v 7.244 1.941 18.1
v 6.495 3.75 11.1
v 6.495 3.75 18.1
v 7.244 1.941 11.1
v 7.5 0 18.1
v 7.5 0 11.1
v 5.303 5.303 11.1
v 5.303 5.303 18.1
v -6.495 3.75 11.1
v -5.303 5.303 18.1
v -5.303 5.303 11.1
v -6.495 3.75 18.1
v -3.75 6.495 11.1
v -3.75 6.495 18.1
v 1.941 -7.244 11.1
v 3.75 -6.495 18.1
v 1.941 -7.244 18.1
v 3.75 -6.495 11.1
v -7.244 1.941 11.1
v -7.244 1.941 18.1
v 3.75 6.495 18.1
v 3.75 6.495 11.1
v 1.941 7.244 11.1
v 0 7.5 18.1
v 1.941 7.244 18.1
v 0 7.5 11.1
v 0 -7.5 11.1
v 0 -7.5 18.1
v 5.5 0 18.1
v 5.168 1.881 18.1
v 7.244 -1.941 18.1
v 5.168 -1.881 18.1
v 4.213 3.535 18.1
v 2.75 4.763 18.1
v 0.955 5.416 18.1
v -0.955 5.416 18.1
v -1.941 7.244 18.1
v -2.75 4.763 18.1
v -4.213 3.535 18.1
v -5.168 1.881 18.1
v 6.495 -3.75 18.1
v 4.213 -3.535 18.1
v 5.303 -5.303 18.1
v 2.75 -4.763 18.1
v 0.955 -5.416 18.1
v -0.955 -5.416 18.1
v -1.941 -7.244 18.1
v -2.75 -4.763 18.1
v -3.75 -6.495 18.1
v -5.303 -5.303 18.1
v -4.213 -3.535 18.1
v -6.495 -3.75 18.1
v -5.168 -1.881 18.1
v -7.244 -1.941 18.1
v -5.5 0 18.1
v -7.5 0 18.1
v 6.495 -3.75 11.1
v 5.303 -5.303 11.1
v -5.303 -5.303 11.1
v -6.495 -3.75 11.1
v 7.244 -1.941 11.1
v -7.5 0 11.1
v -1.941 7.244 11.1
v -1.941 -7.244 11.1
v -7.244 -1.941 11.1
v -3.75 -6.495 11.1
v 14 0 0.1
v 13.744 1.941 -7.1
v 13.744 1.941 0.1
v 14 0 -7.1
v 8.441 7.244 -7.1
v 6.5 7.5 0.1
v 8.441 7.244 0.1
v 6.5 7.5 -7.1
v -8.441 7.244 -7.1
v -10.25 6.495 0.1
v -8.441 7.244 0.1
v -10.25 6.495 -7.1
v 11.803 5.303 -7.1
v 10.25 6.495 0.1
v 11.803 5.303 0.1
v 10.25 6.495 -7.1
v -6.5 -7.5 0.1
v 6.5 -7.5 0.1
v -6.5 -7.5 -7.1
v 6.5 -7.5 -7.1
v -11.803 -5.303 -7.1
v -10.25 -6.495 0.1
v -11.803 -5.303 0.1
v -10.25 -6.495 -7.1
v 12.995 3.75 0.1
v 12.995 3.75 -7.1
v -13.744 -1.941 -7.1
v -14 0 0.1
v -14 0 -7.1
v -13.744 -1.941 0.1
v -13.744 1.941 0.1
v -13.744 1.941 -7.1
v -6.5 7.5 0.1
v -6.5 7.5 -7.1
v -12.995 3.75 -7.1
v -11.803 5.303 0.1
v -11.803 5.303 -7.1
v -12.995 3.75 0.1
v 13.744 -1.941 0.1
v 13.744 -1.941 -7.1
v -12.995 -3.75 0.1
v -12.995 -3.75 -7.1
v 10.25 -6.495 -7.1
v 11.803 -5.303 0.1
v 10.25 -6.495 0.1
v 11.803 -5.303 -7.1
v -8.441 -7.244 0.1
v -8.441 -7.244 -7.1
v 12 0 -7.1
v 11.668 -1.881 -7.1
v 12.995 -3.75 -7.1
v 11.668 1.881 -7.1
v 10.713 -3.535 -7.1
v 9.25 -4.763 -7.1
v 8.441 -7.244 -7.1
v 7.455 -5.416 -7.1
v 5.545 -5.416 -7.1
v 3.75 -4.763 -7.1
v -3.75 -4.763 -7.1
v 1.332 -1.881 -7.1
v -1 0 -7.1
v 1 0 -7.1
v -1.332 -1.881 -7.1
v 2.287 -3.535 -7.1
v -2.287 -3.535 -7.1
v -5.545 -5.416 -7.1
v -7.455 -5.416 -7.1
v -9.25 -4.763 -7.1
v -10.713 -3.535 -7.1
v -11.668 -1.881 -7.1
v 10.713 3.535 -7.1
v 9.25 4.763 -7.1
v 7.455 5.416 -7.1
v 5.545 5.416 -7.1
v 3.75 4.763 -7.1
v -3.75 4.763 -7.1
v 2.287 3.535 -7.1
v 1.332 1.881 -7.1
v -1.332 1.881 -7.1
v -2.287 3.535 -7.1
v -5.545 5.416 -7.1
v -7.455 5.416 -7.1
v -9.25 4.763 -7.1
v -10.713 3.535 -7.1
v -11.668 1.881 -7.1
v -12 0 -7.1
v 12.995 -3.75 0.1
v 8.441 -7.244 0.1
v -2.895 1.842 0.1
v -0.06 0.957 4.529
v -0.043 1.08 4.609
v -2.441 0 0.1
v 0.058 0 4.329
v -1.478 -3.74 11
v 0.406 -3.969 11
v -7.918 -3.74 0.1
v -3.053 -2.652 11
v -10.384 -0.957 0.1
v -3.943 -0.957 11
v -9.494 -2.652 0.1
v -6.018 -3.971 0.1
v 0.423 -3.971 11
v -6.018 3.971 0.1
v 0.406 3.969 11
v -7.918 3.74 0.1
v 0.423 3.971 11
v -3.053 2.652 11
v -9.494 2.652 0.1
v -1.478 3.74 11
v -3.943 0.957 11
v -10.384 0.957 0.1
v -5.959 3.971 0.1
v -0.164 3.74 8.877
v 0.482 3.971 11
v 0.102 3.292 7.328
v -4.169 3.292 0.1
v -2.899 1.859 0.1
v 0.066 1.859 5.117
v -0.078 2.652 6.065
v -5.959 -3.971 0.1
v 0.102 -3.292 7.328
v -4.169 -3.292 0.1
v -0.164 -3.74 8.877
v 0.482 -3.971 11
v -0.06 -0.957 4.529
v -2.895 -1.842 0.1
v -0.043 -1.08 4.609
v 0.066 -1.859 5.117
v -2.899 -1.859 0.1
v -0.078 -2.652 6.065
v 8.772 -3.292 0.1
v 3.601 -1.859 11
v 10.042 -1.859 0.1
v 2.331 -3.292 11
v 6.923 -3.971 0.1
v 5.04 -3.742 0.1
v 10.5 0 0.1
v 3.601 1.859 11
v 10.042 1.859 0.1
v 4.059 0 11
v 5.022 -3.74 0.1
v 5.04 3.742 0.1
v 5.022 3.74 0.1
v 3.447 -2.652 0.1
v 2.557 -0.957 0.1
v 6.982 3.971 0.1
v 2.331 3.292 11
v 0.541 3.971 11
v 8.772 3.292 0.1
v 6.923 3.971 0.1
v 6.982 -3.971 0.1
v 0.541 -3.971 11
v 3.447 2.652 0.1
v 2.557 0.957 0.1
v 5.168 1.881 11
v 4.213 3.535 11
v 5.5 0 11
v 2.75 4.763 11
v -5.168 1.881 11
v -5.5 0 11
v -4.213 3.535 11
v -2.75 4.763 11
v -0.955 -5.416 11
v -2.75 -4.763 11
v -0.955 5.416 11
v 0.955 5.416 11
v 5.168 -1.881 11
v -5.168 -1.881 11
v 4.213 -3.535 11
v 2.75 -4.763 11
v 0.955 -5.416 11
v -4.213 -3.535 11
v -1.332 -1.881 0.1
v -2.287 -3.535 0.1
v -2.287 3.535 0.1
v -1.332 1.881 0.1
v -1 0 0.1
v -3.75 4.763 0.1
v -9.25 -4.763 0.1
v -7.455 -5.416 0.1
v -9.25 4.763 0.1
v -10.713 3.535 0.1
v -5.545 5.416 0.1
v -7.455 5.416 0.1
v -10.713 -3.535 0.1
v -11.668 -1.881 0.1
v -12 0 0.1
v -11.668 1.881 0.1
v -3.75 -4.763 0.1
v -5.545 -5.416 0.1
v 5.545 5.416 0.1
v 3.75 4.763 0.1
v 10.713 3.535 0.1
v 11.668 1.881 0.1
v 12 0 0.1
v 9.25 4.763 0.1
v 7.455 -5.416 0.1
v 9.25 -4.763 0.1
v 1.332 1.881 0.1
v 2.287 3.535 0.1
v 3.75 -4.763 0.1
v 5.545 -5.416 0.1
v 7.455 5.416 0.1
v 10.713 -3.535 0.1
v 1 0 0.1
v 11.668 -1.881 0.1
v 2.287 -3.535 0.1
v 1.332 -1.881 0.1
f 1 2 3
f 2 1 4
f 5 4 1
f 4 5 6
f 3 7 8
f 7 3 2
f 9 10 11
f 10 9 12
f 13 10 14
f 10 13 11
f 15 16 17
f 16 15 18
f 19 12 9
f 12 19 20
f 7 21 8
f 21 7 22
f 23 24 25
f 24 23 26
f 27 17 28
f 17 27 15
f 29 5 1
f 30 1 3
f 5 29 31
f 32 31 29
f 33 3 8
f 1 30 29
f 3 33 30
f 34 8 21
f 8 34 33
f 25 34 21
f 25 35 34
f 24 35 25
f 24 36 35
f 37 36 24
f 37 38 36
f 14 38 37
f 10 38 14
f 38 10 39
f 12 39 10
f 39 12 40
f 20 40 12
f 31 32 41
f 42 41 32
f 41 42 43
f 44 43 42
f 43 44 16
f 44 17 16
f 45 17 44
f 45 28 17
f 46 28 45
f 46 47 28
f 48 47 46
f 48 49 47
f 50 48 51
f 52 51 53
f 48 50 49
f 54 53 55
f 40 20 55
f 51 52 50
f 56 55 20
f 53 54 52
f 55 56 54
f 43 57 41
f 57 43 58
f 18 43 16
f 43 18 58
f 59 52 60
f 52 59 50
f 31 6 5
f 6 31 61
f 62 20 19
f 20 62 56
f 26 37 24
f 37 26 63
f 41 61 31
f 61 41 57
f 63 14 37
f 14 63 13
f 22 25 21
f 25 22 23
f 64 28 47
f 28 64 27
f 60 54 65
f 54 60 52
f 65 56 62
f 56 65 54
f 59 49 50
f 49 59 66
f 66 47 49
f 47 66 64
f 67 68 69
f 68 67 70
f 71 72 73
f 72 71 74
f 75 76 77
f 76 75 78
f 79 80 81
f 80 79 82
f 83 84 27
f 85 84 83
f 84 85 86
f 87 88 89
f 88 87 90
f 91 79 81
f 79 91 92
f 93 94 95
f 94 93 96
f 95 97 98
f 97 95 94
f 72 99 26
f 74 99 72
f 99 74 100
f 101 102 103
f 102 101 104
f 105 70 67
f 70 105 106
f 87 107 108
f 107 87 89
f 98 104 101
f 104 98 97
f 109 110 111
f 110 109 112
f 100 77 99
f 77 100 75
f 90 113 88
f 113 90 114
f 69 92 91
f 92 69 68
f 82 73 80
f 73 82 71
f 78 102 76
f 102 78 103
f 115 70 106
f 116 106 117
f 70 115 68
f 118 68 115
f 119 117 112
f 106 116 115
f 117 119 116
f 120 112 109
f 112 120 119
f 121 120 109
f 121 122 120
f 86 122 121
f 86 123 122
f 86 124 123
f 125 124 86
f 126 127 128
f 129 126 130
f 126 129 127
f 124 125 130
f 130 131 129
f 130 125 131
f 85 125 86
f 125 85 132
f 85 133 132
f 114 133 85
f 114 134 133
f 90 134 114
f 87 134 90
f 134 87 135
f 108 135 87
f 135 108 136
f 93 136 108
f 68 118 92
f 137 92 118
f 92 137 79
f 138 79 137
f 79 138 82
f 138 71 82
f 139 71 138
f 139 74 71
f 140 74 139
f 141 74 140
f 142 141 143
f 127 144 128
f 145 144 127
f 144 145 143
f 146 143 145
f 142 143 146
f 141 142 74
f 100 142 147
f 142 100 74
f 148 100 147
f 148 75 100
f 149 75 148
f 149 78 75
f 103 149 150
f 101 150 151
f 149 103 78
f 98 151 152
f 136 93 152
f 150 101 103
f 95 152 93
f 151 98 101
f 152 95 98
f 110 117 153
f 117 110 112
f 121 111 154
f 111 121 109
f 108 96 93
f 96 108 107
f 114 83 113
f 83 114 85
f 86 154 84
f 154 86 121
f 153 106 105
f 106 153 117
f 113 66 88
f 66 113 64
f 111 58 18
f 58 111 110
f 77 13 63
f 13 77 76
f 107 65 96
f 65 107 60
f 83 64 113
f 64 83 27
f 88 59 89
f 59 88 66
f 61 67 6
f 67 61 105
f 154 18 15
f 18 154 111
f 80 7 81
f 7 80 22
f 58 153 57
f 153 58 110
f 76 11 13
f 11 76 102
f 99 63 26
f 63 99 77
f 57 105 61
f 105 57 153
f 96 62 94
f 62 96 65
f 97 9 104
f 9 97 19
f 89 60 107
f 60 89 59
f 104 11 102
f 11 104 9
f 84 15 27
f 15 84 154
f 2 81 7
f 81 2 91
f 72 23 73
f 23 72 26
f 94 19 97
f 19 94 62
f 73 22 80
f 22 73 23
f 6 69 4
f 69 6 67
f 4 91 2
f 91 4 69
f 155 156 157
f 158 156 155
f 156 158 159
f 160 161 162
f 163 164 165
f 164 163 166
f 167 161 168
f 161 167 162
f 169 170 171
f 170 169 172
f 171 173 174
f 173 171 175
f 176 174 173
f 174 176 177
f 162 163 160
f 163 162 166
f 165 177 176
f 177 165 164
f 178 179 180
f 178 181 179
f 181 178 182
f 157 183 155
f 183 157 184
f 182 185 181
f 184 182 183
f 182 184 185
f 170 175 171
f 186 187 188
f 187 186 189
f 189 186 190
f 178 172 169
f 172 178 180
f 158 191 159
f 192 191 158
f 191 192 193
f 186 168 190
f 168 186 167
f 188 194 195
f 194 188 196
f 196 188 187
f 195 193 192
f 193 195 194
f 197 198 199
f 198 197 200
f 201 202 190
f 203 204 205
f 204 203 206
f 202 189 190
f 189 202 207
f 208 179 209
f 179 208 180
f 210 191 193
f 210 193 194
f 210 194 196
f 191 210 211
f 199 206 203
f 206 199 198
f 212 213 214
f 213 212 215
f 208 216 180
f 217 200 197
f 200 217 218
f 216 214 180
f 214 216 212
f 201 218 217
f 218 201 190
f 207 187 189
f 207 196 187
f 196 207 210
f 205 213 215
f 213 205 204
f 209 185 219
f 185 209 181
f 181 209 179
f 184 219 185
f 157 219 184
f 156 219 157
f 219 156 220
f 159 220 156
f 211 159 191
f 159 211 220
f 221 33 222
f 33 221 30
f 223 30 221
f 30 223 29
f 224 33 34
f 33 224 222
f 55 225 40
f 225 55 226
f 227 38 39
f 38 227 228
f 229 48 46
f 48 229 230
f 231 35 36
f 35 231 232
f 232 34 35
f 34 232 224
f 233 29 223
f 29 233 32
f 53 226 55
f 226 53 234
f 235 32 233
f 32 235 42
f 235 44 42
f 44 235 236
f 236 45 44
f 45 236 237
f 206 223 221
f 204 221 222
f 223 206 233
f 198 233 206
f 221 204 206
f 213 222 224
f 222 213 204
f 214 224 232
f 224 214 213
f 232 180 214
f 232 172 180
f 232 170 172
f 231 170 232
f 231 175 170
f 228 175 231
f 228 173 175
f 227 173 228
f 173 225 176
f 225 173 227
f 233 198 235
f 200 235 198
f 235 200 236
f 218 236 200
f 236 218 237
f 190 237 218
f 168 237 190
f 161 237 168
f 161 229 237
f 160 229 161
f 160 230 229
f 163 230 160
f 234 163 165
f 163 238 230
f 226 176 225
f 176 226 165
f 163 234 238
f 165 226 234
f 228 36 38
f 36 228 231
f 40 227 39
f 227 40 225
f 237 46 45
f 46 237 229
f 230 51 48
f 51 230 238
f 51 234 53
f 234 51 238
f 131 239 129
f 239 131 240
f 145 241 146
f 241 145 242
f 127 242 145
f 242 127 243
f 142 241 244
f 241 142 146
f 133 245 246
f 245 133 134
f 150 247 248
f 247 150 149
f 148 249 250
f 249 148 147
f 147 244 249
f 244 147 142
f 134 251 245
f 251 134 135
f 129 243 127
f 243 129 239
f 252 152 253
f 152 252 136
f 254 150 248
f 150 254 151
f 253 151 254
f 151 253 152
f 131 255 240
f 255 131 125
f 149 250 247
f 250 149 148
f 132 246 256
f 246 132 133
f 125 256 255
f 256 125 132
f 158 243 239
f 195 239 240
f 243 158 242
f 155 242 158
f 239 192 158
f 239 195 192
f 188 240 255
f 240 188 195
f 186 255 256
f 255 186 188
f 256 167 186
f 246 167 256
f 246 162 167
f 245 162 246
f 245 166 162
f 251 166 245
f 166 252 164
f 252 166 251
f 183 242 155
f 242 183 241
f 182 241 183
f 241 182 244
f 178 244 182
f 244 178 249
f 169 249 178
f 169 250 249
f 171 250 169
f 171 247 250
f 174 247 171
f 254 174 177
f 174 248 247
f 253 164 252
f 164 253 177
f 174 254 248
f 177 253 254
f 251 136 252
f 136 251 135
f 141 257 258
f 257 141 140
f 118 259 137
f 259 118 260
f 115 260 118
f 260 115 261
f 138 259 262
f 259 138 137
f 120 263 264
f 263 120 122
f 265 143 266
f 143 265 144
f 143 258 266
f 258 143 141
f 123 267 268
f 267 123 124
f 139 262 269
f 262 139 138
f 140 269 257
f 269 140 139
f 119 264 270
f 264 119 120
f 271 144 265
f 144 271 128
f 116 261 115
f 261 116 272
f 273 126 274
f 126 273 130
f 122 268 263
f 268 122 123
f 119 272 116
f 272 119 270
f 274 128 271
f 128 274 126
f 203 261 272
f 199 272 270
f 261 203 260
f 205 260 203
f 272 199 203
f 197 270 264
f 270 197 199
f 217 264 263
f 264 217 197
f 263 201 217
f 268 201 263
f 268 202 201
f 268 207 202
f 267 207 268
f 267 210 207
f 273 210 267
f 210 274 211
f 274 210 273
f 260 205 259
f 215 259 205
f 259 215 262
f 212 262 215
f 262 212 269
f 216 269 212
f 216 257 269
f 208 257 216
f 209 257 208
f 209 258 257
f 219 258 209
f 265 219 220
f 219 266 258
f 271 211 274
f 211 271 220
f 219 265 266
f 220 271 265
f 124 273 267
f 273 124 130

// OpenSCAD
// measurements of tubes that shall be connected, tube 1 is largest

outside1=11;
inside1=8;
outside2=11;
inside2=8;
outside3=11;
inside3=8;

difference()
{
union ()
{
translate ([0,0,outside1]) cylinder(h=4.9+outside1*0.2, r=outside1/2+2);
hull()
{
translate ([outside2/-2-1,0,-4.9-outside1*0.2]) cylinder(h=4.9+outside1*0.2, r=outside2/2+2);
translate ([outside3/2+1,0,-4.9-outside1*0.2]) cylinder(h=4.9+outside1*0.2, r=outside3/2+2);
}
hull()
{
translate ([0,0,outside1]) cylinder(h=0.1, r=outside1/2+2);
translate ([outside3/2+1,0,0]) cylinder(h=0.1, r=outside3/2+2);
translate ([outside2/-2-1,0,0]) cylinder(h=0.1, r=outside2/2+2);
}
}

union()
{
hull()
{
translate ([0,0,outside1]) cylinder(h=0.1, r=inside1/2);
translate ([outside2/-2-1,0,0]) cylinder(h=0.1, r=inside2/2);
}

hull()
{
translate ([0,0,outside1]) cylinder(h=0.1, r=inside1/2);
translate ([outside3/2+1,0,0]) cylinder(h=0.1, r=inside3/2);
}
translate ([0,0,outside1]) cylinder(h=5+outside1*0.2, r=outside1/2);
translate ([outside2/-2-1,0,-5-outside1*0.2]) cylinder(h=5.1+outside1*0.2, r=outside2/2);
translate ([outside3/2+1,0,-5-outside1*0.2]) cylinder(h=5.1+outside1*0.2, r=outside3/2);
}
}
